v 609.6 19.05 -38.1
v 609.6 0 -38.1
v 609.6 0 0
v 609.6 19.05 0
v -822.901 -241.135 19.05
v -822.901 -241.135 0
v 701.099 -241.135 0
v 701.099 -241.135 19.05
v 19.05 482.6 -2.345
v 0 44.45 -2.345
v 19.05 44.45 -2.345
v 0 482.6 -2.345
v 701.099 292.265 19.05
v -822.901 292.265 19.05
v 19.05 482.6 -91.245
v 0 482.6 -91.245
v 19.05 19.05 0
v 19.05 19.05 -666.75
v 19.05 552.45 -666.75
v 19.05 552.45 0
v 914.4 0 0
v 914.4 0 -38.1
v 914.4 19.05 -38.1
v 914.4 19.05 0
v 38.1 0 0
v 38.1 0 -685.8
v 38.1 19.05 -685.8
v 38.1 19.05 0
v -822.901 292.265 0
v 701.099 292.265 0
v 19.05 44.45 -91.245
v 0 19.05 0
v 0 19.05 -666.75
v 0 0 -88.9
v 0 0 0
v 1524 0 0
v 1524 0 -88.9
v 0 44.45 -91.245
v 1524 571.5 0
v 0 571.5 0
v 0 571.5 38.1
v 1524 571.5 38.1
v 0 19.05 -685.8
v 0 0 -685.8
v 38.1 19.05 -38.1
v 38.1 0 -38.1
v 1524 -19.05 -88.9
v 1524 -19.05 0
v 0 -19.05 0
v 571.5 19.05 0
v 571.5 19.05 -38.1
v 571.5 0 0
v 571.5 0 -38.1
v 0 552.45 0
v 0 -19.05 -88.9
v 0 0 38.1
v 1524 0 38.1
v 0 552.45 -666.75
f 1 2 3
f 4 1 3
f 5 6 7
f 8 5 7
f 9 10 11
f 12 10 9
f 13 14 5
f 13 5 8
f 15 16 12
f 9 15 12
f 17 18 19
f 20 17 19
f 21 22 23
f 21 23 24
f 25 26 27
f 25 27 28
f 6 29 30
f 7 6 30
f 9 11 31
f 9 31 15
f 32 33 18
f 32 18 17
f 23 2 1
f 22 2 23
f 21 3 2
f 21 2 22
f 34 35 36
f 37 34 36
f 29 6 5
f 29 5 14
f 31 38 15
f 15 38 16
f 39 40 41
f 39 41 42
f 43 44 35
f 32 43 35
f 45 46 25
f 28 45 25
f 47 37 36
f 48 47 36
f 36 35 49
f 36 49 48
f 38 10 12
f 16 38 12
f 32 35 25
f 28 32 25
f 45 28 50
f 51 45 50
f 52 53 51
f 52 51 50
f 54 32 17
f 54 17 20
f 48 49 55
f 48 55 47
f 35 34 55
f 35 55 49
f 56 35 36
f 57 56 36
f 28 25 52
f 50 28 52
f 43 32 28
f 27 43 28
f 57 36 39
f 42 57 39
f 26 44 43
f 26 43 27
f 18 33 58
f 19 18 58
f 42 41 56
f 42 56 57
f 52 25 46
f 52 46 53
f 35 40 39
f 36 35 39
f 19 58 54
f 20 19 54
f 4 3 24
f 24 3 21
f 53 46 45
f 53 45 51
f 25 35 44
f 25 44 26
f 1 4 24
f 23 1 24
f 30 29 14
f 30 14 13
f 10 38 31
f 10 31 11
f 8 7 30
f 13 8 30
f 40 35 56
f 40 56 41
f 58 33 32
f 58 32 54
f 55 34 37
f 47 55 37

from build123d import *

# Parameters (mm, degrees)
F0_W      = 1524
F0_H      = 571.5
F1_DEPTH  = 38.1
F2_W      = 38.1
F2_H      = 685.8
F3_DEPTH  = 19.05
F4_W      = 533.4
F4_H      = 38.1
F6_DEPTH  = 19.05
F5_W      = 304.8
F5_H      = 38.1
F7_DEPTH  = 19.05
F8_W      = 533.4
F8_H      = 666.75
F9_DEPTH  = 19.05
F10_W     = 1524
F10_H     = 533.4
F11_DEPTH = 19.05
F12_W     = 1524
F12_H     = 88.9
F13_DEPTH = 19.05
F14_W     = 438.15
F14_H     = 88.9
F15_DEPTH = 19.05


# Not quite as in the source:
# - a feature names something its author has since deleted; it is built from what else it names


with BuildPart() as f1:
    # F0 (on Top) → F1 (new body)
    with BuildSketch(Plane.XY):
        with Locations((762, 285.75)):
            Rectangle(F0_W, F0_H)
    extrude(amount=F1_DEPTH)


with BuildPart() as f3:
    # F2 (on Front) → F3 (new body)
    with BuildSketch(Plane.XZ):
        with Locations((19.05, -342.9)):
            Rectangle(F2_W, F2_H)
    extrude(amount=-F3_DEPTH)


with BuildPart() as f6:
    # F4 (on Front) → F6 (new body)
    with BuildSketch(Plane.XZ):
        with Locations((304.8, -19.05)):
            Rectangle(F4_W, F4_H)
    extrude(amount=-F6_DEPTH)


with BuildPart() as f7:
    # F5 (on Front) → F7 (new body)
    with BuildSketch(Plane.XZ):
        with Locations((762, -19.05)):
            Rectangle(F5_W, F5_H)
    extrude(amount=-F7_DEPTH)


with BuildPart() as f9:
    # F8 (on Right) → F9 (new body)
    with BuildSketch(Plane.YZ):
        with Locations((285.75, -333.375)):
            Rectangle(F8_W, F8_H)
    extrude(amount=F9_DEPTH)


with BuildPart() as f11:
    # F10 (on Top) → F11 (new body)
    with BuildSketch(Plane.XY):
        with Locations((-60.9013997018, 25.5651345968)):
            Rectangle(F10_W, F10_H)
    extrude(amount=F11_DEPTH)


with BuildPart() as f13:
    # F12 (on Front) → F13 (new body)
    with BuildSketch(Plane.XZ):
        with Locations((762, -44.45)):
            Rectangle(F12_W, F12_H)
    extrude(amount=F13_DEPTH)


with BuildPart() as f15:
    # F14 (on Right) → F15 (new body)
    with BuildSketch(Plane.YZ):
        with Locations((263.525, -46.7950011114)):
            Rectangle(F14_W, F14_H)
    extrude(amount=F15_DEPTH)


solid = Compound([f1.part, f3.part, f6.part, f7.part, f9.part, f11.part, f13.part, f15.part])
